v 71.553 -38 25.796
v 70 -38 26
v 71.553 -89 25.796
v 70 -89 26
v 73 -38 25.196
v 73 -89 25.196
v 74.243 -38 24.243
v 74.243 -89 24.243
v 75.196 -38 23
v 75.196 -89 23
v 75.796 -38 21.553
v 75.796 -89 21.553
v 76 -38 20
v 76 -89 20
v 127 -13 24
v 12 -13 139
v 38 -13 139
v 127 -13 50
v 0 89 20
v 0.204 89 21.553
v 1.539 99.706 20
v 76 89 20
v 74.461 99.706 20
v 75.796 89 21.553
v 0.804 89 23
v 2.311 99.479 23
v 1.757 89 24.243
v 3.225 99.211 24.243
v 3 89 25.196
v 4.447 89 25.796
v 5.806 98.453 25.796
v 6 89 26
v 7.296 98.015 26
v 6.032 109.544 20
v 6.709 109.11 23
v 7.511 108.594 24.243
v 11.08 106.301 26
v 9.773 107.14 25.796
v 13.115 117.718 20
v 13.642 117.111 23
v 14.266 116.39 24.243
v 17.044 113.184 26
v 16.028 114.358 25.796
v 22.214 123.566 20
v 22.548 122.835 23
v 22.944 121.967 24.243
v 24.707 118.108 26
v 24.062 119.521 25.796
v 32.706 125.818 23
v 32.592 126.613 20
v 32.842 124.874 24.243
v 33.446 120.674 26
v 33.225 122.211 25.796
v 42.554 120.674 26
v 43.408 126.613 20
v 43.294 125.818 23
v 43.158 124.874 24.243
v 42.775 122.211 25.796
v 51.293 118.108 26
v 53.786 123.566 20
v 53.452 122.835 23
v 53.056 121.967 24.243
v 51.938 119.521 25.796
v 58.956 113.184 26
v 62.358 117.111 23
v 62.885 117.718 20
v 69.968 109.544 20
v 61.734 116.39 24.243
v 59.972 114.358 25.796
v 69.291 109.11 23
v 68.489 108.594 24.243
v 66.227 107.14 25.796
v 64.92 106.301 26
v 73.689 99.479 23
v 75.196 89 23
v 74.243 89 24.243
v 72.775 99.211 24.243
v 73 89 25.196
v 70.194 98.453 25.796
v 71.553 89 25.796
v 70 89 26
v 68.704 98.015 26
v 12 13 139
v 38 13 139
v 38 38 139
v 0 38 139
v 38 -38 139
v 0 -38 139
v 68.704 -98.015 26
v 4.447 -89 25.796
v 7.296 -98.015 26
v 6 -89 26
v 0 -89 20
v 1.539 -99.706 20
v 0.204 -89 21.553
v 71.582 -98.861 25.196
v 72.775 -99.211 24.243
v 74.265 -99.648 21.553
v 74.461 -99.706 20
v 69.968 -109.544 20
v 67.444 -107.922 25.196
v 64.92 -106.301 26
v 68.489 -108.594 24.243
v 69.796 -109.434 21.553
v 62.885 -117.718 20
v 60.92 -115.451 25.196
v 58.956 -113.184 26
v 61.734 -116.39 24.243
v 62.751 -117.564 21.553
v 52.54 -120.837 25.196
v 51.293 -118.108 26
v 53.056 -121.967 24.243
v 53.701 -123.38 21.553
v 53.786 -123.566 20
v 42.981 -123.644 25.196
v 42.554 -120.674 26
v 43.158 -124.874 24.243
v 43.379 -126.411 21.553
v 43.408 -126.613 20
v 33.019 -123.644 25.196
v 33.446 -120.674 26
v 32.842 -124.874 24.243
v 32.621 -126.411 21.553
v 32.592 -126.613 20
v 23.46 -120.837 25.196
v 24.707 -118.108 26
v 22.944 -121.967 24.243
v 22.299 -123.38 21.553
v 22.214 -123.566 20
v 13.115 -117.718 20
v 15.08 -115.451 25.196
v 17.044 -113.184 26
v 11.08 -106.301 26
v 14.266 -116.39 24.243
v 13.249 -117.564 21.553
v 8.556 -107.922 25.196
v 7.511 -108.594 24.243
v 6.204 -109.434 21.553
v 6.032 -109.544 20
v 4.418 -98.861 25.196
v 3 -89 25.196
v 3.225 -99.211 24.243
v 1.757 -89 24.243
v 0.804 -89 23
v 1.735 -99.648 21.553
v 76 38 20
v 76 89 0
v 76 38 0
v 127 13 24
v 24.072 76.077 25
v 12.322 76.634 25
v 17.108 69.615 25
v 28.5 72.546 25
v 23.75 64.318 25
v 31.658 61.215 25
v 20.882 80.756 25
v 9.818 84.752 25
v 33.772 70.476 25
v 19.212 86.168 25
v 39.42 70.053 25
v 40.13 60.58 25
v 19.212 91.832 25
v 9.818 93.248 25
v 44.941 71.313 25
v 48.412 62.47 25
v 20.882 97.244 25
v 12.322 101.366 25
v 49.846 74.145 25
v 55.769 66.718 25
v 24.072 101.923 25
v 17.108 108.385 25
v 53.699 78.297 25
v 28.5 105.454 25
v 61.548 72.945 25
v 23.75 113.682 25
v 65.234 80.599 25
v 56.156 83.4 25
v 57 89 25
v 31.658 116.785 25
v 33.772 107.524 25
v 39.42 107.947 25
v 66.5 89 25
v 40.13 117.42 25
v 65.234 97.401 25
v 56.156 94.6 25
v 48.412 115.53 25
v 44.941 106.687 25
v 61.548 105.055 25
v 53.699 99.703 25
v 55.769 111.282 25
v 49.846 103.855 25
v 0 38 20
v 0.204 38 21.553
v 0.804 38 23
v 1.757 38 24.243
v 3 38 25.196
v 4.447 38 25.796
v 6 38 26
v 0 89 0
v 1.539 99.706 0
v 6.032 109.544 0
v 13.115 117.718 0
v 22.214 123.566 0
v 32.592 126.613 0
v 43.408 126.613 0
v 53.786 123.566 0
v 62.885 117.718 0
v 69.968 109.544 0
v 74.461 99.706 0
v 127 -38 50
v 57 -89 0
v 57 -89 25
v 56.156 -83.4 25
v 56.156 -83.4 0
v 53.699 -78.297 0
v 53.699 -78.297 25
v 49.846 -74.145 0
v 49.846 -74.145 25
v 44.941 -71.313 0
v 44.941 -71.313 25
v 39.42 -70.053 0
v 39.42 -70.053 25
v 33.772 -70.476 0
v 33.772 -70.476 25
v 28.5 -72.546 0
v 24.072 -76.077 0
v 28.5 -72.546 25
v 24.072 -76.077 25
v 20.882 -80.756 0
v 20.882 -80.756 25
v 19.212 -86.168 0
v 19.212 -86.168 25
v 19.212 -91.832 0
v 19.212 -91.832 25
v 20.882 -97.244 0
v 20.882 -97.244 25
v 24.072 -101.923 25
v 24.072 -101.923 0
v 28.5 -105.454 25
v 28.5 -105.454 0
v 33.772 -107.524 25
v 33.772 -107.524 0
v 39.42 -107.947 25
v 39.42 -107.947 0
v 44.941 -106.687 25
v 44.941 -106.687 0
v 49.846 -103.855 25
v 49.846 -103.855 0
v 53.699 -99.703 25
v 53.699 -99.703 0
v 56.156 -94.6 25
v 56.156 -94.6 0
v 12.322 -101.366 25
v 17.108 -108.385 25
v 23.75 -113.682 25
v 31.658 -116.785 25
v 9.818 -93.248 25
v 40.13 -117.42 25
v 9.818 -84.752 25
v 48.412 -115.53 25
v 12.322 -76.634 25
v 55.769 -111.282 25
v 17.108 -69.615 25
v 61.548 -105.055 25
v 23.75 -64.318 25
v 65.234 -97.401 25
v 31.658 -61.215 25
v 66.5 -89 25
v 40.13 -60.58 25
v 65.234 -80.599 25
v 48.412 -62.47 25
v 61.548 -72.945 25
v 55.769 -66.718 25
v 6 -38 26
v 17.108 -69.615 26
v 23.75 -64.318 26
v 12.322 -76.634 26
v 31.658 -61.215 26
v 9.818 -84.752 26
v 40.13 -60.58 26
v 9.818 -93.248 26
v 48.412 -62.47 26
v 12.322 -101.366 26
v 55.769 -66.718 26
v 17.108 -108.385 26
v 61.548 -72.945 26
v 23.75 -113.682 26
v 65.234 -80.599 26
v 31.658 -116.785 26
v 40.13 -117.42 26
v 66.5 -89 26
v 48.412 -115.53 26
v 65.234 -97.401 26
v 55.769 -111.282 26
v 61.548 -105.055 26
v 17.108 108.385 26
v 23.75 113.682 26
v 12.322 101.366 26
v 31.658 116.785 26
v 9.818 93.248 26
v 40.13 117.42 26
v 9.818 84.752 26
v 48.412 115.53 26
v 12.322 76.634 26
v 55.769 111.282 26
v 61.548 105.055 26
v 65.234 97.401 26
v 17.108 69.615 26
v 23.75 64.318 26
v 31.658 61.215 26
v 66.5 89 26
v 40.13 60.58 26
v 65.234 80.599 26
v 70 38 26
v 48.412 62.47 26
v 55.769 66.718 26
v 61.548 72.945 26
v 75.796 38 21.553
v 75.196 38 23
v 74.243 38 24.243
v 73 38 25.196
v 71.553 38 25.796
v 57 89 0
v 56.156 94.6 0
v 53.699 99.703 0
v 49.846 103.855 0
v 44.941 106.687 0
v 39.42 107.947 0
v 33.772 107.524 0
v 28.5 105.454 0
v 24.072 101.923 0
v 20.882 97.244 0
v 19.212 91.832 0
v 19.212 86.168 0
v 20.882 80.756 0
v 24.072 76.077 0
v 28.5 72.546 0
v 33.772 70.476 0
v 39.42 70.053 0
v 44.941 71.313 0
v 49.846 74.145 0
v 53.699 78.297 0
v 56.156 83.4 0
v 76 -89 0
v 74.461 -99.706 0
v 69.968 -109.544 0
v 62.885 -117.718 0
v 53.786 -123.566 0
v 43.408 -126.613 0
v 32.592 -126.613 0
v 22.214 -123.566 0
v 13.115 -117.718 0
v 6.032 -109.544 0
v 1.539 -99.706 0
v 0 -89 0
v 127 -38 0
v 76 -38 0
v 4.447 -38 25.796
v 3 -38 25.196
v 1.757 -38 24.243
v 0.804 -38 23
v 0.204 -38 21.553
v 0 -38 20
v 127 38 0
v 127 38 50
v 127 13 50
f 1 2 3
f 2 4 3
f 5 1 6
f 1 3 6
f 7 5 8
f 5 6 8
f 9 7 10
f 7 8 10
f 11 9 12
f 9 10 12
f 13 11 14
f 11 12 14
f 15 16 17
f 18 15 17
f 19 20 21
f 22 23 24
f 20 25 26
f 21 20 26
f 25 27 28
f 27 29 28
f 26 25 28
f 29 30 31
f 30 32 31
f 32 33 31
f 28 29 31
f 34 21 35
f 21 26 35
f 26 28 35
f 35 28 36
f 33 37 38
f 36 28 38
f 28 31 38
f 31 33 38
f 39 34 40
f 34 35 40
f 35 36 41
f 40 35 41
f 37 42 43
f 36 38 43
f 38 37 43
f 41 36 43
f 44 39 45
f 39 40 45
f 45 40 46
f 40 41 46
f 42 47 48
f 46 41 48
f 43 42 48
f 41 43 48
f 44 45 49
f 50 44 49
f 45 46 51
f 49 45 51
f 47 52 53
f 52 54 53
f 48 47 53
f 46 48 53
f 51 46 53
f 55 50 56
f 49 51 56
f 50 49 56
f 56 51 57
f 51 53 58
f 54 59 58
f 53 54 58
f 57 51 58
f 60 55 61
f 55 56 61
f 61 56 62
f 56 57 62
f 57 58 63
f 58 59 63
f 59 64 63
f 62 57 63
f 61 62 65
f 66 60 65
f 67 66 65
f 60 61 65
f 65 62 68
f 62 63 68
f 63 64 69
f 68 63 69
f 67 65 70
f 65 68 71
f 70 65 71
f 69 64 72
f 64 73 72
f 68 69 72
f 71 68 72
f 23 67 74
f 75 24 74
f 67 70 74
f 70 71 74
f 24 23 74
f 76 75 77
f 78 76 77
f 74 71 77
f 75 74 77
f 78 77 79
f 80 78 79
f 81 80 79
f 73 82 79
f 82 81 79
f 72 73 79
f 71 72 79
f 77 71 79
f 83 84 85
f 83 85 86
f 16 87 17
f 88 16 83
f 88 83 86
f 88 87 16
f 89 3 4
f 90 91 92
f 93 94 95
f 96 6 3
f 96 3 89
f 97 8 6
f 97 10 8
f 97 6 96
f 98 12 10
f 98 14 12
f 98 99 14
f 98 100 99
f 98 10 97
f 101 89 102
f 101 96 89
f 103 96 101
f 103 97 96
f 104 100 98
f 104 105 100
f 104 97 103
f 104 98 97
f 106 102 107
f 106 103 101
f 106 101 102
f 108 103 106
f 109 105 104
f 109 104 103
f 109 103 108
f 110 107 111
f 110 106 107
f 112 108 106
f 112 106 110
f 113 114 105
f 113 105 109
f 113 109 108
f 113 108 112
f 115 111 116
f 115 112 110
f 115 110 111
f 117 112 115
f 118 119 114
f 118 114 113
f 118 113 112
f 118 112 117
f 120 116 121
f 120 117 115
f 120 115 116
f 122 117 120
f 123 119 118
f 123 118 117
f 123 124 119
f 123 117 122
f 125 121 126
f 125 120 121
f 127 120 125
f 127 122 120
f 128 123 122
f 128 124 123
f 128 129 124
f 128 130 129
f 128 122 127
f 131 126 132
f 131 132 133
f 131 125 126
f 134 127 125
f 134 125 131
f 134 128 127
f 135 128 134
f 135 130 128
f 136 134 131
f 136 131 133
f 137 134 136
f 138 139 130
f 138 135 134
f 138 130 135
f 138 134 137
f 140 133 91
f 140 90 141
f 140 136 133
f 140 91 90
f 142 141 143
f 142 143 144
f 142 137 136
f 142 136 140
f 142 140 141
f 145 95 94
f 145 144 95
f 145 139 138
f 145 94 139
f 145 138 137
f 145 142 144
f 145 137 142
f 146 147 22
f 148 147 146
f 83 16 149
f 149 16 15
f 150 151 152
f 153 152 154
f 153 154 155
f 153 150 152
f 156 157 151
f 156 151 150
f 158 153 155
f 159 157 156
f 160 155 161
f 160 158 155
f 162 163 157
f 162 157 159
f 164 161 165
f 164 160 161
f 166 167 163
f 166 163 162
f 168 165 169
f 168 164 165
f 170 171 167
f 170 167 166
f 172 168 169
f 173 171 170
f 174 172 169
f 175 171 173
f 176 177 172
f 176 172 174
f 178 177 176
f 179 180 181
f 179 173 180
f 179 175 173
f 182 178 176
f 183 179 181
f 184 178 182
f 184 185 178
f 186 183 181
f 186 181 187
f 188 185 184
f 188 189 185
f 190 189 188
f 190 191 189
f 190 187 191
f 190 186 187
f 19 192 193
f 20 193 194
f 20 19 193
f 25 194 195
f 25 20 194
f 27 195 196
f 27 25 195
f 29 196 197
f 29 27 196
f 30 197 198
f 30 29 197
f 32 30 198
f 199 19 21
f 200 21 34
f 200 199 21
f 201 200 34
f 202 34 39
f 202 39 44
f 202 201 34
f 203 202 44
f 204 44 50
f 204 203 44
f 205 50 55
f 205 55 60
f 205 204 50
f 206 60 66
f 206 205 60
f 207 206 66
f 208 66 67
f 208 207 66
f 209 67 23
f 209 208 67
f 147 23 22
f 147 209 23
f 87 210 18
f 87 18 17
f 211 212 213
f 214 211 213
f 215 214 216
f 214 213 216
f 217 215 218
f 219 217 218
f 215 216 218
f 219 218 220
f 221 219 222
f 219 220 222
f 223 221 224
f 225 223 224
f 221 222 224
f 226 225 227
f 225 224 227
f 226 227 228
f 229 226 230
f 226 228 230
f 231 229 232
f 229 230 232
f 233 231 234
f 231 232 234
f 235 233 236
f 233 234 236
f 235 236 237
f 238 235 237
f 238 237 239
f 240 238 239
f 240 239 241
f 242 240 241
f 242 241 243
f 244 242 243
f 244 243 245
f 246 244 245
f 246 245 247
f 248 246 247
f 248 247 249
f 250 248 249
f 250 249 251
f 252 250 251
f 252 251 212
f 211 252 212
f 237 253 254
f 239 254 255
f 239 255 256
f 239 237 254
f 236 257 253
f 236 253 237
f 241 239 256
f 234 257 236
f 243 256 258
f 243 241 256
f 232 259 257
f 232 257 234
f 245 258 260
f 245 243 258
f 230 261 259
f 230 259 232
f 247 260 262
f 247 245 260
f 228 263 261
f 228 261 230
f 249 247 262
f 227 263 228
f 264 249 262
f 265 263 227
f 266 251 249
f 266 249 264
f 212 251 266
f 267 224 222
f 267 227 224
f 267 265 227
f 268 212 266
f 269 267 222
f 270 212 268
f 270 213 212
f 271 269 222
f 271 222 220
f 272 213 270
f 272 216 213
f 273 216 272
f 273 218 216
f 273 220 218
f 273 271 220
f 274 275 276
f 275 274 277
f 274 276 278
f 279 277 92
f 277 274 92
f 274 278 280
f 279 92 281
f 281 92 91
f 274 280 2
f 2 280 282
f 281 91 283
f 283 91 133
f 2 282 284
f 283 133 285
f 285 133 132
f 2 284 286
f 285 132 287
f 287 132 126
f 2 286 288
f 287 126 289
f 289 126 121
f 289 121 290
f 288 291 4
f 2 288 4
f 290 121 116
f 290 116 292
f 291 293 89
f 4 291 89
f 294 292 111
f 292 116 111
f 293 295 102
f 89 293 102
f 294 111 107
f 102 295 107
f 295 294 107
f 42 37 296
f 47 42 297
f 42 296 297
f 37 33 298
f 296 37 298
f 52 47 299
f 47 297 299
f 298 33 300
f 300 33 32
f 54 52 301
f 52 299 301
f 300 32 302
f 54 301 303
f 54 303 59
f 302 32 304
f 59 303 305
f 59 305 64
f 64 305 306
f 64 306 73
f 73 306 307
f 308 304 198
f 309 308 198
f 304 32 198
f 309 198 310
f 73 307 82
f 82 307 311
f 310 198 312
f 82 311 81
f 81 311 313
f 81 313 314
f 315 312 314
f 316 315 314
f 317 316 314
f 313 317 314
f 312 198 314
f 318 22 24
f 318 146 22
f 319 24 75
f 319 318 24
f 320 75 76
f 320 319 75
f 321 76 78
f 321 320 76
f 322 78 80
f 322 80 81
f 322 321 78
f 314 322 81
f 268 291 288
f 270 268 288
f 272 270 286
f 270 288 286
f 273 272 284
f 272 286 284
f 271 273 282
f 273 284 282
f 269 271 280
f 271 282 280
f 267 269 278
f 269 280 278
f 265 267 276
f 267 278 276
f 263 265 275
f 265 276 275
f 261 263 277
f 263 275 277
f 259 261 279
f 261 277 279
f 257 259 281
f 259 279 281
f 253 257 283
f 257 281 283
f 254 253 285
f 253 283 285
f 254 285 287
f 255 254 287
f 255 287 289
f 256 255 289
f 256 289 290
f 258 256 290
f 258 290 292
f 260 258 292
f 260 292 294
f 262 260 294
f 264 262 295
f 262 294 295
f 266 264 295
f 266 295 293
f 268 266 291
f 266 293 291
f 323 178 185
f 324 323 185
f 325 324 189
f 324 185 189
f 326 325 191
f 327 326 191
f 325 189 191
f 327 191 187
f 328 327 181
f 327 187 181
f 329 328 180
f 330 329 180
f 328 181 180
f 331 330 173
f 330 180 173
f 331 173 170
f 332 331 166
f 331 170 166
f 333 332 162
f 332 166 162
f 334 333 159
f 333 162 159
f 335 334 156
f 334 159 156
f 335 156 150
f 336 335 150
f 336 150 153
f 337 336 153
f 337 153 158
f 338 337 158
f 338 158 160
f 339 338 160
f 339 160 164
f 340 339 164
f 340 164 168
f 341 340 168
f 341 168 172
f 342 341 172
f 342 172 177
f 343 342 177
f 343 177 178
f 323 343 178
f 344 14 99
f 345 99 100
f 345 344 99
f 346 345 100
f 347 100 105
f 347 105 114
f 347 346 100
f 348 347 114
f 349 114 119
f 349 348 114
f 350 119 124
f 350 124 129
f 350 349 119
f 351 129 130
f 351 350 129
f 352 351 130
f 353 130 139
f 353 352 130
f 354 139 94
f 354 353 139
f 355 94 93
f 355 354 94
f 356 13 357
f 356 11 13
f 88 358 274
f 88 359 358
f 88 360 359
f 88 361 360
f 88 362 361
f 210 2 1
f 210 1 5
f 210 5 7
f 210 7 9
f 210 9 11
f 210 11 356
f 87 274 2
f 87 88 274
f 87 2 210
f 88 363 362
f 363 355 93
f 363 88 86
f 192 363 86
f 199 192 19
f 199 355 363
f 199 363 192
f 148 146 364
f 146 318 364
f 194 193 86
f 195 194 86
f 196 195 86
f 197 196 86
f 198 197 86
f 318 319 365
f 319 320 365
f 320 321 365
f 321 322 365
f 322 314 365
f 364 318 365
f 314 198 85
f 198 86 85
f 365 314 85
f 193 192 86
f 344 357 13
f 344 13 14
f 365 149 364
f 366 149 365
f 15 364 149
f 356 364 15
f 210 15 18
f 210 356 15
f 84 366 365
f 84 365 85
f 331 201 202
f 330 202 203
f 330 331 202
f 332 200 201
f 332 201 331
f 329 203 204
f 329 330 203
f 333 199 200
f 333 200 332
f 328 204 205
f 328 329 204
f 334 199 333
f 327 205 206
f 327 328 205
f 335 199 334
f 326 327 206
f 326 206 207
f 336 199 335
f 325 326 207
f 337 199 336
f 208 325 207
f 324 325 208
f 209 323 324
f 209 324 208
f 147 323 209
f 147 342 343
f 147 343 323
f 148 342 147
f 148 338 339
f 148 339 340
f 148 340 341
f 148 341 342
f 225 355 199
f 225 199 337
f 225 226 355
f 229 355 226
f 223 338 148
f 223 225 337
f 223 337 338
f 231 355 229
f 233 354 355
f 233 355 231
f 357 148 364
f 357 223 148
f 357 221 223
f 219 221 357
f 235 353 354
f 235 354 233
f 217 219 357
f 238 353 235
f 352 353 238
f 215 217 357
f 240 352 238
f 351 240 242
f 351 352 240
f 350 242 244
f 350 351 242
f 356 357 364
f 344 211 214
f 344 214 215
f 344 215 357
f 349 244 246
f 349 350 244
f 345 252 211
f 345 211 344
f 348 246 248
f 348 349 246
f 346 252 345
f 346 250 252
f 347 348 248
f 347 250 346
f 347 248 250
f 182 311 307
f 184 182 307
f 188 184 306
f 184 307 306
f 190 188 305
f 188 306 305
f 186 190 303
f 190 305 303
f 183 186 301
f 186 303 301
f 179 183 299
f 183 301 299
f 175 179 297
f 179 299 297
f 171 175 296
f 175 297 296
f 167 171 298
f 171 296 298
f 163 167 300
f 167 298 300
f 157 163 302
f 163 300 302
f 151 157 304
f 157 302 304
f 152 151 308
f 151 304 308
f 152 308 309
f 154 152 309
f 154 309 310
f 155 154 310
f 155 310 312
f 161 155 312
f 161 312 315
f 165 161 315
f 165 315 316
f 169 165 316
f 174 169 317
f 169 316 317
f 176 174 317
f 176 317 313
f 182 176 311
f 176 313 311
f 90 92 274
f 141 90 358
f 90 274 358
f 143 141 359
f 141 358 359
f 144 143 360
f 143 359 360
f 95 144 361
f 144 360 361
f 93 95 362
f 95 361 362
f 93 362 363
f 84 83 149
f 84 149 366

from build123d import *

# Parameters (mm, degrees)
F1_DEPTH  = 38
F4_DEPTH  = 13
F5_DEPTH  = 26
F6_R      = 19
F7_DEPTH  = 26.001
F8_R      = 28.5
F9_DEPTH  = 1
F10_R     = 19
F11_DEPTH = 26.001
F12_R     = 28.5
F13_DEPTH = 1
F14_R     = 6


with BuildPart() as f1:
    # F0 (on Front) → F1 (new body, symmetric)
    with BuildSketch(Plane.XZ):
        Polygon((0, 139), (0, 0), (127, 0), (127, 50), (38, 139), align=None)
    extrude(amount=F1_DEPTH, both=True)

    # F3 (on Front) → F4 (cut, symmetric)
    with BuildSketch(Plane.XZ):
        Polygon((127, 50), (38, 139), (12, 139), (127, 24), align=None)
    extrude(amount=F4_DEPTH, both=True, mode=Mode.SUBTRACT)

    # F2 (on face) → F5 (join)
    with BuildSketch(Plane(origin=(0, 0, 0), x_dir=(1, 0, 0), z_dir=(0, 0, -1))):
        with BuildLine():
            ThreePointArc((0, -89), (38, -127), (76, -89))
            Line((76, -89), (76, 89))
            ThreePointArc((76, 89), (38, 127), (0, 89))
            Line((0, 89), (0, -89))
        make_face()
    extrude(amount=-F5_DEPTH)

    # F6 (on face) → F7 (cut, through all)
    with BuildSketch(Plane.XY.offset(26)):
        with Locations((38, -89)):
            Circle(F6_R)
    extrude(amount=-F7_DEPTH, mode=Mode.SUBTRACT)

    # F8 (on face) → F9 (cut)
    with BuildSketch(Plane.XY.offset(26)):
        with Locations((38, -89)):
            Circle(F8_R)
    extrude(amount=-F9_DEPTH, mode=Mode.SUBTRACT)

    # F10 (on face) → F11 (cut, through all)
    with BuildSketch(Plane.XY.offset(26)):
        with Locations((38, 89)):
            Circle(F10_R)
    extrude(amount=-F11_DEPTH, mode=Mode.SUBTRACT)

    # F12 (on face) → F13 (cut)
    with BuildSketch(Plane.XY.offset(26)):
        with Locations((38, 89)):
            Circle(F12_R)
    extrude(amount=-F13_DEPTH, mode=Mode.SUBTRACT)

    # F14
    f14_edges = [f1.edges().sort_by_distance(p)[0] for p in [
        (76, -63.5, 26),
        (76, 63.5, 26),
        (0, 63.5, 26),
        (0, -63.5, 26),
        (38, -127, 26),
        (38, 127, 26),
    ]]
    fillet(f14_edges, radius=F14_R)


solid = f1.part
